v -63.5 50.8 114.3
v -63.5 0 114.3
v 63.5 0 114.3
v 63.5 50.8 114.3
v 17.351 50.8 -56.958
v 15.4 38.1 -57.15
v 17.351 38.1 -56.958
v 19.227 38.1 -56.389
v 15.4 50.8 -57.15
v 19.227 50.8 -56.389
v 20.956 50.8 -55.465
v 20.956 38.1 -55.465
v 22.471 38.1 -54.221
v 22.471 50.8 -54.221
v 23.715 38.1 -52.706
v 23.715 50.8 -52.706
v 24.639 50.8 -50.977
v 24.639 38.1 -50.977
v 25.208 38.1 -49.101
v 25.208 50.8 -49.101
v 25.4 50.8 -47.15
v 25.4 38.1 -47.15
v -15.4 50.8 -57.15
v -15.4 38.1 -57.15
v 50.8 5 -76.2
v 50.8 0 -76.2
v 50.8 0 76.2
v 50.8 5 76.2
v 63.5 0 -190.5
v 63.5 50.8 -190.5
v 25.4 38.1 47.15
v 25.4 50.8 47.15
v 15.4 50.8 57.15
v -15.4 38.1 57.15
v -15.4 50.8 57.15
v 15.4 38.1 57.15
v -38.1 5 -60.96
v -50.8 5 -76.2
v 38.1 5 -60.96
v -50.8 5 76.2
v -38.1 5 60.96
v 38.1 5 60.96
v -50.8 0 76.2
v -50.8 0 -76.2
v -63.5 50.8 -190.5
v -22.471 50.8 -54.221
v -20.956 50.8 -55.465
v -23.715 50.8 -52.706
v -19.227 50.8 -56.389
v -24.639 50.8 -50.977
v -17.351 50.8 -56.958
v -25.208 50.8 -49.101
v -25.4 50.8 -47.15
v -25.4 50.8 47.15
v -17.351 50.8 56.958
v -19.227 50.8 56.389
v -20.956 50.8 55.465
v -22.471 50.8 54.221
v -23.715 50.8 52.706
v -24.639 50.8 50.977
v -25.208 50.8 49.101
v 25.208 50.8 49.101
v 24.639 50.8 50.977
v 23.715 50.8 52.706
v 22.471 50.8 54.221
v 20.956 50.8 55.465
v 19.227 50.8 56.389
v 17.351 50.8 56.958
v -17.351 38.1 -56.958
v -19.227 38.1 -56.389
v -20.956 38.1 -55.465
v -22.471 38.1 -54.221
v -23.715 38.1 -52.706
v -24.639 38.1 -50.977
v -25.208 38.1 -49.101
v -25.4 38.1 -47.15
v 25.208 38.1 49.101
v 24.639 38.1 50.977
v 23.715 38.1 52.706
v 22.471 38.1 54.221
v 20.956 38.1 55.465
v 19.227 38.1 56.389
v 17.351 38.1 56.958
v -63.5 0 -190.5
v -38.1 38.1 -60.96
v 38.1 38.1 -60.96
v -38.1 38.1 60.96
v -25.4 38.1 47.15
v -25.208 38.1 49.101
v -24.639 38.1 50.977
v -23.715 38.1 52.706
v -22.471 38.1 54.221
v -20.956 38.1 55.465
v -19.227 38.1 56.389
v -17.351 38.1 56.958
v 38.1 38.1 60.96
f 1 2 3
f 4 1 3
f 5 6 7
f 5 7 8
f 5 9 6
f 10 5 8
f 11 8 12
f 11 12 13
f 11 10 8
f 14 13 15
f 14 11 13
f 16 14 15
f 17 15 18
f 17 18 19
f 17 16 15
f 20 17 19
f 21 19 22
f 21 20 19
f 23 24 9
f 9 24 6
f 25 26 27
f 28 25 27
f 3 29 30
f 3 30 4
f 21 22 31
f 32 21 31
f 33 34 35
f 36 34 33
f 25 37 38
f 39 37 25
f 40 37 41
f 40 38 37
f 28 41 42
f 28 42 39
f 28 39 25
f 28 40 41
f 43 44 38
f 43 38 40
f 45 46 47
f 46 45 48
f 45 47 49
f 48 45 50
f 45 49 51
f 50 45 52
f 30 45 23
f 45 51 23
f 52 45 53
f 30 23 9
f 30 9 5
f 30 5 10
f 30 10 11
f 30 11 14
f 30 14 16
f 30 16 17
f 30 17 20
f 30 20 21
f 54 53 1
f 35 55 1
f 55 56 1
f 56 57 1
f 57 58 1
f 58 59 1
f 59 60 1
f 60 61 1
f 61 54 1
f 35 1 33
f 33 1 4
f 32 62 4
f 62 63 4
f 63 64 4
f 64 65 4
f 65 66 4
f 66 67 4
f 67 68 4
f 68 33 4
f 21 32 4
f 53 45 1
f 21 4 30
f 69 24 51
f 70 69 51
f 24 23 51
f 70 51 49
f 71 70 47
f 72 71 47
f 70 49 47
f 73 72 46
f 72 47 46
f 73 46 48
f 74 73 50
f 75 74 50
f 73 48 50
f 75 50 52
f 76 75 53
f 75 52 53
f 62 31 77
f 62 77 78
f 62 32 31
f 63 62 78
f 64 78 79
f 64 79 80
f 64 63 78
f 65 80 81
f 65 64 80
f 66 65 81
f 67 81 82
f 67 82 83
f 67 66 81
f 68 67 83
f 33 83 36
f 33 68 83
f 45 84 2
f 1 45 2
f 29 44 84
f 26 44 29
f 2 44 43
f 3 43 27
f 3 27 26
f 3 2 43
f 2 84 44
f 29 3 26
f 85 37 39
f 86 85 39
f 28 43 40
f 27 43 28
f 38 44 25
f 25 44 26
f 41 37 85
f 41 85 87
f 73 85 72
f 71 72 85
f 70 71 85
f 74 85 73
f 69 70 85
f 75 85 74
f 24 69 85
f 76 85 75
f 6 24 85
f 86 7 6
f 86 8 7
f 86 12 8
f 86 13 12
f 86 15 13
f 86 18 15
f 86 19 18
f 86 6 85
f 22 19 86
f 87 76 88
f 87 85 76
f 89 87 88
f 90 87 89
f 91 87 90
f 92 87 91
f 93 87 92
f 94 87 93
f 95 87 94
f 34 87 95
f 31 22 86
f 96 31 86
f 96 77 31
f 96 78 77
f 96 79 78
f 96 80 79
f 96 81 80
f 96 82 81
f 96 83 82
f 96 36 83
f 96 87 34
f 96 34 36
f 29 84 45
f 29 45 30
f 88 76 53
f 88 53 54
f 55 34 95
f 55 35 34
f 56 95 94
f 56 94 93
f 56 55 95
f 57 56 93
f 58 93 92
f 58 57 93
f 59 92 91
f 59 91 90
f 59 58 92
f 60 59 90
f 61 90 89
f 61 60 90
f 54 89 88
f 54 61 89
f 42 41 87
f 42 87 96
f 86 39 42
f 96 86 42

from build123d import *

# Parameters (mm, degrees)
F0_W     = 127
F0_H     = 304.8
F0_W_2   = 101.6
F0_H_2   = 152.4
F0_W_3   = 76.2
F0_H_3   = 121.92
F0_W_4   = 50.8
F0_H_4   = 114.3
F1_DEPTH = 50.8
F2_DEPTH = 5
F3_DEPTH = 38.1
F4_R     = 10


with BuildPart() as f1:
    # F0 (on Front) → F1 (new body)
    with BuildSketch(Plane.XZ):
        with Locations((0, -38.1)):
            Rectangle(F0_W, F0_H)
        Rectangle(F0_W_2, F0_H_2, mode=Mode.SUBTRACT)
        Rectangle(F0_W_2, F0_H_2)
        Rectangle(F0_W_3, F0_H_3, mode=Mode.SUBTRACT)
        Rectangle(F0_W_3, F0_H_3)
        Rectangle(F0_W_4, F0_H_4, mode=Mode.SUBTRACT)
    extrude(amount=-F1_DEPTH)

    # F0 (on Front) → F2 (cut)
    with BuildSketch(Plane.XZ):
        Rectangle(F0_W_2, F0_H_2)
        Rectangle(F0_W_3, F0_H_3, mode=Mode.SUBTRACT)
    extrude(amount=-F2_DEPTH, mode=Mode.SUBTRACT)

    # F0 (on Front) → F3 (cut)
    with BuildSketch(Plane.XZ):
        Rectangle(F0_W_3, F0_H_3)
        Rectangle(F0_W_4, F0_H_4, mode=Mode.SUBTRACT)
    extrude(amount=-F3_DEPTH, mode=Mode.SUBTRACT)

    # F4
    f4_edges = [f1.edges().sort_by_distance(p)[0] for p in [
        (-25.4, 44.45, 57.15),
        (25.4, 44.45, 57.15),
        (-25.4, 44.45, -57.15),
        (25.4, 44.45, -57.15),
    ]]
    fillet(f4_edges, radius=F4_R)


solid = f1.part
